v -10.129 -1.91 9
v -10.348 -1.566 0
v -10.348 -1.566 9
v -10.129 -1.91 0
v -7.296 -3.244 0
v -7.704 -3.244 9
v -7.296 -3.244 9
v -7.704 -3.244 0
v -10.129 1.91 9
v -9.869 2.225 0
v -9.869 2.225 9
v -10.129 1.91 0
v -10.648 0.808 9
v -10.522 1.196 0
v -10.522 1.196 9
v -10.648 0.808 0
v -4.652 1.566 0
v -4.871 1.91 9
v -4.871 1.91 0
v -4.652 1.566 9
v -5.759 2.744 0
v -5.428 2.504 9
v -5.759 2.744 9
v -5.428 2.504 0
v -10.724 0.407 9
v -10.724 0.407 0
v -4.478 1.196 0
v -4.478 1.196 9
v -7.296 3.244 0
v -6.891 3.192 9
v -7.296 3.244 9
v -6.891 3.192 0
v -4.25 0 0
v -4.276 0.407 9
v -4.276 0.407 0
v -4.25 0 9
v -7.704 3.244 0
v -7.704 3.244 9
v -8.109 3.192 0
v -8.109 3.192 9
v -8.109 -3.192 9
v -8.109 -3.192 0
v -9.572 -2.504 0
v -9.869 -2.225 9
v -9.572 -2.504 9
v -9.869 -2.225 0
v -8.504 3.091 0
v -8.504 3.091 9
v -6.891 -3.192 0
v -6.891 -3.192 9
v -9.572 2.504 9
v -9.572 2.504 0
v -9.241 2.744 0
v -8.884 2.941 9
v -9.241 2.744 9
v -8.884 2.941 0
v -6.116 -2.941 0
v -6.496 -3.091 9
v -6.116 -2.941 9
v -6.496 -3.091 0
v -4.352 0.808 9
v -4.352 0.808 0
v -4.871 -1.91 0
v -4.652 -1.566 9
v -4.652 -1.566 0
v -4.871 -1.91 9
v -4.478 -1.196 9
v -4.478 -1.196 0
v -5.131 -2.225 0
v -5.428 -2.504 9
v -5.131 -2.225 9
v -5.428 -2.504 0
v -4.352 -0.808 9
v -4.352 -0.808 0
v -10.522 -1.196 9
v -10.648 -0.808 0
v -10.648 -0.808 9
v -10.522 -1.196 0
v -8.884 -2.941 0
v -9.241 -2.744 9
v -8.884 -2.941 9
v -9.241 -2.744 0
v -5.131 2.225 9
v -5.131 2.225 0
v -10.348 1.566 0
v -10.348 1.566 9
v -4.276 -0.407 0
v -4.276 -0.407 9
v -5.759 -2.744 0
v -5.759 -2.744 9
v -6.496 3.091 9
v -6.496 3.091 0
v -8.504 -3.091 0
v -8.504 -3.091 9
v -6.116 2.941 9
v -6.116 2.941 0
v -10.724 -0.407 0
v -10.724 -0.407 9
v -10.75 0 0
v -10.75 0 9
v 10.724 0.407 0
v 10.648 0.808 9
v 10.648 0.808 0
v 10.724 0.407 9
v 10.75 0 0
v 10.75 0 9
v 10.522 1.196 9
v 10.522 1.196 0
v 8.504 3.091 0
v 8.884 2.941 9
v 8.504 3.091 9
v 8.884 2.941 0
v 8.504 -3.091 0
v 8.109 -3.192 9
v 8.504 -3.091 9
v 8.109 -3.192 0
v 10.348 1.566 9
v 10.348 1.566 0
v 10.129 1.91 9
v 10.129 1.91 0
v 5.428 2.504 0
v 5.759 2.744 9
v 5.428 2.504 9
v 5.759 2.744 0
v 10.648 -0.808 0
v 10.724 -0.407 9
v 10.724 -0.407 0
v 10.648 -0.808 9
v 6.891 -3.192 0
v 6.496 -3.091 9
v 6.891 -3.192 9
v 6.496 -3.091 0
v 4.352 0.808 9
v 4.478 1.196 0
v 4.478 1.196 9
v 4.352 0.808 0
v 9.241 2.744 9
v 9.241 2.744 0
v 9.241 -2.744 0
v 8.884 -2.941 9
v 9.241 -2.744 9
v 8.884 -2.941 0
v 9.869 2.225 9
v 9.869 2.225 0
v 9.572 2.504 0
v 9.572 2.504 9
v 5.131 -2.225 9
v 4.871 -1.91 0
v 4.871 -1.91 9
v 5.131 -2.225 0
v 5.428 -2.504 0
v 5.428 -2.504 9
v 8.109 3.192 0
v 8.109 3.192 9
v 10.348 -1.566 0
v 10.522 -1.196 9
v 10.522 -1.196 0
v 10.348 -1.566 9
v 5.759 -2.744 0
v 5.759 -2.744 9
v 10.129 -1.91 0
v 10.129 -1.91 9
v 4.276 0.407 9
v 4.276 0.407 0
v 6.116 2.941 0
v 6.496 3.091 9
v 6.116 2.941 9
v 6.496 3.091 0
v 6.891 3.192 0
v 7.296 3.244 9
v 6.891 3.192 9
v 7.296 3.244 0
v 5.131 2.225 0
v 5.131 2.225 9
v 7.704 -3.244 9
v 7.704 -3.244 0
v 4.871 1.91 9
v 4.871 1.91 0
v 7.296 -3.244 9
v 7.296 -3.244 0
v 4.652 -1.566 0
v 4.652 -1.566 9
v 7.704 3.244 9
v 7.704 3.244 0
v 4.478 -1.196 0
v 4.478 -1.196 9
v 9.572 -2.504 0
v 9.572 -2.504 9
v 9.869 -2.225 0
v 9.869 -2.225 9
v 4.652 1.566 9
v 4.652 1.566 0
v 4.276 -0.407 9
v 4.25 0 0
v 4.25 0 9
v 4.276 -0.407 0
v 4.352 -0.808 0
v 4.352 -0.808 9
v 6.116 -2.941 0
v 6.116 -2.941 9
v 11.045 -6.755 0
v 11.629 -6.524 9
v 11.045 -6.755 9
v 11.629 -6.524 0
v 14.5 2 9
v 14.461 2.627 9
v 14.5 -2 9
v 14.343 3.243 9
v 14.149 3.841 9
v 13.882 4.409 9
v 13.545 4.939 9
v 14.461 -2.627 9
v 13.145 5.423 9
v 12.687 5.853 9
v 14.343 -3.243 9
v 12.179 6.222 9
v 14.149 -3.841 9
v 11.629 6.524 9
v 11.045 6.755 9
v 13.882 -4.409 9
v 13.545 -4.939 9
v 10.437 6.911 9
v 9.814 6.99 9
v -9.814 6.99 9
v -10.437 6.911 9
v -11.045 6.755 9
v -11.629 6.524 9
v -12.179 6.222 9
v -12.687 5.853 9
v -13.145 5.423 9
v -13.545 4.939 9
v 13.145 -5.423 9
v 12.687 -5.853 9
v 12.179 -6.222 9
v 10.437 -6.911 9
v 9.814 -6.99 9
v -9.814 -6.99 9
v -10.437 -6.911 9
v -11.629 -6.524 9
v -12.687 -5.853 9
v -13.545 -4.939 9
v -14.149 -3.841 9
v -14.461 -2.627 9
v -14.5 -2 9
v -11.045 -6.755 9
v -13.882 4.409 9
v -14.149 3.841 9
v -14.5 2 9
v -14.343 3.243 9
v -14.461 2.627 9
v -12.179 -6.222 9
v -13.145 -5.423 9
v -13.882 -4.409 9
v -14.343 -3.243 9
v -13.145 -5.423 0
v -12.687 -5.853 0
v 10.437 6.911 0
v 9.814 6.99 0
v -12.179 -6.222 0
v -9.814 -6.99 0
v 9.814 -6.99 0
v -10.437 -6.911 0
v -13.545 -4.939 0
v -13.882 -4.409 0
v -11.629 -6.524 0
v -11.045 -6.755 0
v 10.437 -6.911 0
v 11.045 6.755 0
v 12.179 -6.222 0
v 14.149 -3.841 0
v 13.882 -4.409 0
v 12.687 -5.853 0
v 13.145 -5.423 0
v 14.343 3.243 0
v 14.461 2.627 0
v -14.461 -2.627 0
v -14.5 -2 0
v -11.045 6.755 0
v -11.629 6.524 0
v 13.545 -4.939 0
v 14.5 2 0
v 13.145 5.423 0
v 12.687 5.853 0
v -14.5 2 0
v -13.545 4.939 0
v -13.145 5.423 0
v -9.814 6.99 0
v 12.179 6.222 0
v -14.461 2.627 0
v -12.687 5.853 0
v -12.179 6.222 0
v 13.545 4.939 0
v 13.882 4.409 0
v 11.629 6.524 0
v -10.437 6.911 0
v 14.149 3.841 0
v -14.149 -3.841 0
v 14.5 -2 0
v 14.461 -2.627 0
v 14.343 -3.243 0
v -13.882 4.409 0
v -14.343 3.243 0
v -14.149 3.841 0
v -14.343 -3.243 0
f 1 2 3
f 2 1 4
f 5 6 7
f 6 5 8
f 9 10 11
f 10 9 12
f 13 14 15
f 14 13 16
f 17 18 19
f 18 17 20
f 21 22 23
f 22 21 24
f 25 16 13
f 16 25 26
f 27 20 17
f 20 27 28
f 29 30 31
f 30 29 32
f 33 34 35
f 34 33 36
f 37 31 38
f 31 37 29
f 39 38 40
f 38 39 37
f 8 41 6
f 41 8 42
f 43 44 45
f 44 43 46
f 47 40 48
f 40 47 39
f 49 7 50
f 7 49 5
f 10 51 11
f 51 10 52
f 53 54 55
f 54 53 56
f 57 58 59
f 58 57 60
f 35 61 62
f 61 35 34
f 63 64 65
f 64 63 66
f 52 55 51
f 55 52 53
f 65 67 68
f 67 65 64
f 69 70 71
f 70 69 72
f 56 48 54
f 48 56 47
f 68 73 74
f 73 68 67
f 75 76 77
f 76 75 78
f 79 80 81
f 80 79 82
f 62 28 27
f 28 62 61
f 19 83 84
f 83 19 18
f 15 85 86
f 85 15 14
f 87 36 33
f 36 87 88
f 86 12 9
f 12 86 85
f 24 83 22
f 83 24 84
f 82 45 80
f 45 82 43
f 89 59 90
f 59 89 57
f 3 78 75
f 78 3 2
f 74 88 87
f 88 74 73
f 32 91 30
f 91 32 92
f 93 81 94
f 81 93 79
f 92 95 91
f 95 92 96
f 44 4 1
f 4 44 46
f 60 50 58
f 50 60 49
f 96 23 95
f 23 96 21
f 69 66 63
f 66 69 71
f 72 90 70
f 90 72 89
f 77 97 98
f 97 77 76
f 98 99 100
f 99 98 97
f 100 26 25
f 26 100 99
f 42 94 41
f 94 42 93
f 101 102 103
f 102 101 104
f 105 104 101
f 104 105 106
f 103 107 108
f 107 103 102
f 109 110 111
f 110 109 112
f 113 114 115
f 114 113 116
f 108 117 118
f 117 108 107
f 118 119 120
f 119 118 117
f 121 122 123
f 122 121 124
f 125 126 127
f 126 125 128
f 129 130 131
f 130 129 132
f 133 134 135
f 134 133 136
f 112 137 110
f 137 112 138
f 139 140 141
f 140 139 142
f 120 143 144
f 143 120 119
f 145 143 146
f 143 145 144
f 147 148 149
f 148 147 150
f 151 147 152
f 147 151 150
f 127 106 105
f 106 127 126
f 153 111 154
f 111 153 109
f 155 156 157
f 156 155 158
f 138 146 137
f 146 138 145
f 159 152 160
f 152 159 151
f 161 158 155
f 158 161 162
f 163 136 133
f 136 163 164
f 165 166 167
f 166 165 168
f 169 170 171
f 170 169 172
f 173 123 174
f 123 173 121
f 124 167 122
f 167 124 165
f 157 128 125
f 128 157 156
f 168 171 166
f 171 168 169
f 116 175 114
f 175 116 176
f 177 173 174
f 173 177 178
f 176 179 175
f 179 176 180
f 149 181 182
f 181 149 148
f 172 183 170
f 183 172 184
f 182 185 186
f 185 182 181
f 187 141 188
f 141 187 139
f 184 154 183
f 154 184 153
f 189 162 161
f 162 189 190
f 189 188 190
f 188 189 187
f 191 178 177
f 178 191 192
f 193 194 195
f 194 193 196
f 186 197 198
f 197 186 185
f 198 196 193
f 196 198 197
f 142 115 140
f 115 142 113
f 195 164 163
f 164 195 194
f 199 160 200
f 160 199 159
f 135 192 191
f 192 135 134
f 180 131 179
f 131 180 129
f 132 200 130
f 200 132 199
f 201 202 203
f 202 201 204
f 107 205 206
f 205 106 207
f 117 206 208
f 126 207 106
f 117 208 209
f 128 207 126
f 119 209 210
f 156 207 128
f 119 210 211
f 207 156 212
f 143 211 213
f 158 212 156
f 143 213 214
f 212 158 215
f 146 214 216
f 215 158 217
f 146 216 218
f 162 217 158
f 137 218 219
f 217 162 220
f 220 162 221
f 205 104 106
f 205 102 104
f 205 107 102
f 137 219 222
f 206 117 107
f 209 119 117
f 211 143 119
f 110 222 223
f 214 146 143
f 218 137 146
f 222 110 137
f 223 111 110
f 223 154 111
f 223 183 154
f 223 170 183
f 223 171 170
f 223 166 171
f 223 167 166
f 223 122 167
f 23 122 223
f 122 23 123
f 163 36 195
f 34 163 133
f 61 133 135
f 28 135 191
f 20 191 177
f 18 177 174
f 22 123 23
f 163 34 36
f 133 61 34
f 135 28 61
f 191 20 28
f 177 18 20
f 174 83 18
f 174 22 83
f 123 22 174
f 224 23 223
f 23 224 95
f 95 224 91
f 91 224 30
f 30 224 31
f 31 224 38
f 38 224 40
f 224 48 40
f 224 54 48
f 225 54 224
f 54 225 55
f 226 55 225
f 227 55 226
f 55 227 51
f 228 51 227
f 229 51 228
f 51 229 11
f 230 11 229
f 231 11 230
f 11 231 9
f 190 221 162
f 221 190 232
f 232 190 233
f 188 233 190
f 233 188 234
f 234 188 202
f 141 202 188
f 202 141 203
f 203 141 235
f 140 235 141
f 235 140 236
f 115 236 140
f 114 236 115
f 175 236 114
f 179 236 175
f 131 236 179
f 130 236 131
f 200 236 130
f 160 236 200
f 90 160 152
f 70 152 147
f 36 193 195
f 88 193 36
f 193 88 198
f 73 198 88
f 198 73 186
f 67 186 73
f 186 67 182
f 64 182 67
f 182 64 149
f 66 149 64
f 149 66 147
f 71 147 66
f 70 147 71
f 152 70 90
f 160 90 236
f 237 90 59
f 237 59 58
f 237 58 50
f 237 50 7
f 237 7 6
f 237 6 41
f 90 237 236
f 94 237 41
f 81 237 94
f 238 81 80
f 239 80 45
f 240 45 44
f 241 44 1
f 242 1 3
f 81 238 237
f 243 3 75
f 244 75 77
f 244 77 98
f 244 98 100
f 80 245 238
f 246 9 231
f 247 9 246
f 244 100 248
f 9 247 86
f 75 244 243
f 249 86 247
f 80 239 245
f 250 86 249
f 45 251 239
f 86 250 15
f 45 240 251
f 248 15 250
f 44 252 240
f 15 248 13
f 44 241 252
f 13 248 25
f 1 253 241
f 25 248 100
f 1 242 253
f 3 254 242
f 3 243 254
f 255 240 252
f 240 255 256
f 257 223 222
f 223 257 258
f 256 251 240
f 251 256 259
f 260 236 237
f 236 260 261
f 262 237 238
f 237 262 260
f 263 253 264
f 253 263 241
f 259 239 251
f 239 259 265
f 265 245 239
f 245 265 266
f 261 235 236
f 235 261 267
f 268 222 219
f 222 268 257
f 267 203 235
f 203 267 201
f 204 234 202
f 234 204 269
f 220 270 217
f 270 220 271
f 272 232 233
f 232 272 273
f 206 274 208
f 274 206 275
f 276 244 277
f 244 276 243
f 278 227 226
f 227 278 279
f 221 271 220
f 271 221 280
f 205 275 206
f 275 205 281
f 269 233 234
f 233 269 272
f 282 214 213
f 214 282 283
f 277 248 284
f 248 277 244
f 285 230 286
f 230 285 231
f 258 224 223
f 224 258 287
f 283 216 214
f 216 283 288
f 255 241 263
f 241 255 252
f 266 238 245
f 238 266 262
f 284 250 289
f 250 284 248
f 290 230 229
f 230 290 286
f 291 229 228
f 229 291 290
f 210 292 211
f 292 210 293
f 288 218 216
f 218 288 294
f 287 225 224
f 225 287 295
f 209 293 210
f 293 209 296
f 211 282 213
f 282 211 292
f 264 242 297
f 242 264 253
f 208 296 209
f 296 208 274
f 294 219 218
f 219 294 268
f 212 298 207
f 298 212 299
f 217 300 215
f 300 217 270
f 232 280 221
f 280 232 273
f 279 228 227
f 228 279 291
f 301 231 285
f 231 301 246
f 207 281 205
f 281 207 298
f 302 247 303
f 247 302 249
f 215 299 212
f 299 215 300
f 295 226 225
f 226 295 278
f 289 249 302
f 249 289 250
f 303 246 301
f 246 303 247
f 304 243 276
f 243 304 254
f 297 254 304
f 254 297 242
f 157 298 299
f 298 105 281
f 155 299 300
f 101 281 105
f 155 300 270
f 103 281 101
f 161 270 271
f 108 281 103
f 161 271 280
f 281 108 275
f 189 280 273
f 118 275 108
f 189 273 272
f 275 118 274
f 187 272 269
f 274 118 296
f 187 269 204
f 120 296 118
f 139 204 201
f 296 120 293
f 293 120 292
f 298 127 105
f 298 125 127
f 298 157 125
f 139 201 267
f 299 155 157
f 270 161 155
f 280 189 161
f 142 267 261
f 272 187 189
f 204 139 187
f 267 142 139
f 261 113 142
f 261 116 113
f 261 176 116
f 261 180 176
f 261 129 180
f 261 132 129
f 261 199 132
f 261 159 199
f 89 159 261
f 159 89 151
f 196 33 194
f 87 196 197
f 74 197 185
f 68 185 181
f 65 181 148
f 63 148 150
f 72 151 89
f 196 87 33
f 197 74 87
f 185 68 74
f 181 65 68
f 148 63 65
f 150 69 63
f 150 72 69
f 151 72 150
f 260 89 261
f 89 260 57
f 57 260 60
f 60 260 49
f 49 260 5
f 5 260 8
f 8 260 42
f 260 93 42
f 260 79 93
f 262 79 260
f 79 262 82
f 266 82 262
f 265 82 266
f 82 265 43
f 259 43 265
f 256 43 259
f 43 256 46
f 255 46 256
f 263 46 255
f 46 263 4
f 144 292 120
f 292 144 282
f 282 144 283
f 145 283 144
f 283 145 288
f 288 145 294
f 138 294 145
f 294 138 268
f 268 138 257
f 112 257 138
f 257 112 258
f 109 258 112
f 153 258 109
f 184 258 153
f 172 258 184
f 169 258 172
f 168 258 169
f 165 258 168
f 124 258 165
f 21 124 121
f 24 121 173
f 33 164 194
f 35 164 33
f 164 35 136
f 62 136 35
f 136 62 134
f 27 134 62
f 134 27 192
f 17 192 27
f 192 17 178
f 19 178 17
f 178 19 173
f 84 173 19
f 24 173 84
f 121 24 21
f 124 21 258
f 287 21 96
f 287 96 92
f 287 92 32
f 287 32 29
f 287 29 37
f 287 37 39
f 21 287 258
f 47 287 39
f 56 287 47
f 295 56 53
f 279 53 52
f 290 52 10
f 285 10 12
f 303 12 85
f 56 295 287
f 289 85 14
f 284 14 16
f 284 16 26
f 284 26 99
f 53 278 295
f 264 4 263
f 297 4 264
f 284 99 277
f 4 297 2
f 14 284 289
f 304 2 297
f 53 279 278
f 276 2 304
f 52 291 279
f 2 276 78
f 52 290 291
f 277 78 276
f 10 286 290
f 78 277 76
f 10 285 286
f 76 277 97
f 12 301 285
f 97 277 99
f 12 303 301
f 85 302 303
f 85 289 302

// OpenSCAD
$fn = 50;


difference() {
	union() {
		hull() {
			translate(v = [-9.5000000000, 2.0000000000, 0]) {
				cylinder(h = 9, r = 5);
			}
			translate(v = [9.5000000000, 2.0000000000, 0]) {
				cylinder(h = 9, r = 5);
			}
			translate(v = [-9.5000000000, -2.0000000000, 0]) {
				cylinder(h = 9, r = 5);
			}
			translate(v = [9.5000000000, -2.0000000000, 0]) {
				cylinder(h = 9, r = 5);
			}
		}
	}
	union() {
		translate(v = [-7.5000000000, 0.0000000000, -100.0000000000]) {
			cylinder(h = 200, r = 3.2500000000);
		}
		translate(v = [-7.5000000000, 0.0000000000, -100.0000000000]) {
			cylinder(h = 200, r = 3.2500000000);
		}
		translate(v = [7.5000000000, 0.0000000000, -100.0000000000]) {
			cylinder(h = 200, r = 3.2500000000);
		}
		translate(v = [7.5000000000, 0.0000000000, -100.0000000000]) {
			cylinder(h = 200, r = 3.2500000000);
		}
	}
}
